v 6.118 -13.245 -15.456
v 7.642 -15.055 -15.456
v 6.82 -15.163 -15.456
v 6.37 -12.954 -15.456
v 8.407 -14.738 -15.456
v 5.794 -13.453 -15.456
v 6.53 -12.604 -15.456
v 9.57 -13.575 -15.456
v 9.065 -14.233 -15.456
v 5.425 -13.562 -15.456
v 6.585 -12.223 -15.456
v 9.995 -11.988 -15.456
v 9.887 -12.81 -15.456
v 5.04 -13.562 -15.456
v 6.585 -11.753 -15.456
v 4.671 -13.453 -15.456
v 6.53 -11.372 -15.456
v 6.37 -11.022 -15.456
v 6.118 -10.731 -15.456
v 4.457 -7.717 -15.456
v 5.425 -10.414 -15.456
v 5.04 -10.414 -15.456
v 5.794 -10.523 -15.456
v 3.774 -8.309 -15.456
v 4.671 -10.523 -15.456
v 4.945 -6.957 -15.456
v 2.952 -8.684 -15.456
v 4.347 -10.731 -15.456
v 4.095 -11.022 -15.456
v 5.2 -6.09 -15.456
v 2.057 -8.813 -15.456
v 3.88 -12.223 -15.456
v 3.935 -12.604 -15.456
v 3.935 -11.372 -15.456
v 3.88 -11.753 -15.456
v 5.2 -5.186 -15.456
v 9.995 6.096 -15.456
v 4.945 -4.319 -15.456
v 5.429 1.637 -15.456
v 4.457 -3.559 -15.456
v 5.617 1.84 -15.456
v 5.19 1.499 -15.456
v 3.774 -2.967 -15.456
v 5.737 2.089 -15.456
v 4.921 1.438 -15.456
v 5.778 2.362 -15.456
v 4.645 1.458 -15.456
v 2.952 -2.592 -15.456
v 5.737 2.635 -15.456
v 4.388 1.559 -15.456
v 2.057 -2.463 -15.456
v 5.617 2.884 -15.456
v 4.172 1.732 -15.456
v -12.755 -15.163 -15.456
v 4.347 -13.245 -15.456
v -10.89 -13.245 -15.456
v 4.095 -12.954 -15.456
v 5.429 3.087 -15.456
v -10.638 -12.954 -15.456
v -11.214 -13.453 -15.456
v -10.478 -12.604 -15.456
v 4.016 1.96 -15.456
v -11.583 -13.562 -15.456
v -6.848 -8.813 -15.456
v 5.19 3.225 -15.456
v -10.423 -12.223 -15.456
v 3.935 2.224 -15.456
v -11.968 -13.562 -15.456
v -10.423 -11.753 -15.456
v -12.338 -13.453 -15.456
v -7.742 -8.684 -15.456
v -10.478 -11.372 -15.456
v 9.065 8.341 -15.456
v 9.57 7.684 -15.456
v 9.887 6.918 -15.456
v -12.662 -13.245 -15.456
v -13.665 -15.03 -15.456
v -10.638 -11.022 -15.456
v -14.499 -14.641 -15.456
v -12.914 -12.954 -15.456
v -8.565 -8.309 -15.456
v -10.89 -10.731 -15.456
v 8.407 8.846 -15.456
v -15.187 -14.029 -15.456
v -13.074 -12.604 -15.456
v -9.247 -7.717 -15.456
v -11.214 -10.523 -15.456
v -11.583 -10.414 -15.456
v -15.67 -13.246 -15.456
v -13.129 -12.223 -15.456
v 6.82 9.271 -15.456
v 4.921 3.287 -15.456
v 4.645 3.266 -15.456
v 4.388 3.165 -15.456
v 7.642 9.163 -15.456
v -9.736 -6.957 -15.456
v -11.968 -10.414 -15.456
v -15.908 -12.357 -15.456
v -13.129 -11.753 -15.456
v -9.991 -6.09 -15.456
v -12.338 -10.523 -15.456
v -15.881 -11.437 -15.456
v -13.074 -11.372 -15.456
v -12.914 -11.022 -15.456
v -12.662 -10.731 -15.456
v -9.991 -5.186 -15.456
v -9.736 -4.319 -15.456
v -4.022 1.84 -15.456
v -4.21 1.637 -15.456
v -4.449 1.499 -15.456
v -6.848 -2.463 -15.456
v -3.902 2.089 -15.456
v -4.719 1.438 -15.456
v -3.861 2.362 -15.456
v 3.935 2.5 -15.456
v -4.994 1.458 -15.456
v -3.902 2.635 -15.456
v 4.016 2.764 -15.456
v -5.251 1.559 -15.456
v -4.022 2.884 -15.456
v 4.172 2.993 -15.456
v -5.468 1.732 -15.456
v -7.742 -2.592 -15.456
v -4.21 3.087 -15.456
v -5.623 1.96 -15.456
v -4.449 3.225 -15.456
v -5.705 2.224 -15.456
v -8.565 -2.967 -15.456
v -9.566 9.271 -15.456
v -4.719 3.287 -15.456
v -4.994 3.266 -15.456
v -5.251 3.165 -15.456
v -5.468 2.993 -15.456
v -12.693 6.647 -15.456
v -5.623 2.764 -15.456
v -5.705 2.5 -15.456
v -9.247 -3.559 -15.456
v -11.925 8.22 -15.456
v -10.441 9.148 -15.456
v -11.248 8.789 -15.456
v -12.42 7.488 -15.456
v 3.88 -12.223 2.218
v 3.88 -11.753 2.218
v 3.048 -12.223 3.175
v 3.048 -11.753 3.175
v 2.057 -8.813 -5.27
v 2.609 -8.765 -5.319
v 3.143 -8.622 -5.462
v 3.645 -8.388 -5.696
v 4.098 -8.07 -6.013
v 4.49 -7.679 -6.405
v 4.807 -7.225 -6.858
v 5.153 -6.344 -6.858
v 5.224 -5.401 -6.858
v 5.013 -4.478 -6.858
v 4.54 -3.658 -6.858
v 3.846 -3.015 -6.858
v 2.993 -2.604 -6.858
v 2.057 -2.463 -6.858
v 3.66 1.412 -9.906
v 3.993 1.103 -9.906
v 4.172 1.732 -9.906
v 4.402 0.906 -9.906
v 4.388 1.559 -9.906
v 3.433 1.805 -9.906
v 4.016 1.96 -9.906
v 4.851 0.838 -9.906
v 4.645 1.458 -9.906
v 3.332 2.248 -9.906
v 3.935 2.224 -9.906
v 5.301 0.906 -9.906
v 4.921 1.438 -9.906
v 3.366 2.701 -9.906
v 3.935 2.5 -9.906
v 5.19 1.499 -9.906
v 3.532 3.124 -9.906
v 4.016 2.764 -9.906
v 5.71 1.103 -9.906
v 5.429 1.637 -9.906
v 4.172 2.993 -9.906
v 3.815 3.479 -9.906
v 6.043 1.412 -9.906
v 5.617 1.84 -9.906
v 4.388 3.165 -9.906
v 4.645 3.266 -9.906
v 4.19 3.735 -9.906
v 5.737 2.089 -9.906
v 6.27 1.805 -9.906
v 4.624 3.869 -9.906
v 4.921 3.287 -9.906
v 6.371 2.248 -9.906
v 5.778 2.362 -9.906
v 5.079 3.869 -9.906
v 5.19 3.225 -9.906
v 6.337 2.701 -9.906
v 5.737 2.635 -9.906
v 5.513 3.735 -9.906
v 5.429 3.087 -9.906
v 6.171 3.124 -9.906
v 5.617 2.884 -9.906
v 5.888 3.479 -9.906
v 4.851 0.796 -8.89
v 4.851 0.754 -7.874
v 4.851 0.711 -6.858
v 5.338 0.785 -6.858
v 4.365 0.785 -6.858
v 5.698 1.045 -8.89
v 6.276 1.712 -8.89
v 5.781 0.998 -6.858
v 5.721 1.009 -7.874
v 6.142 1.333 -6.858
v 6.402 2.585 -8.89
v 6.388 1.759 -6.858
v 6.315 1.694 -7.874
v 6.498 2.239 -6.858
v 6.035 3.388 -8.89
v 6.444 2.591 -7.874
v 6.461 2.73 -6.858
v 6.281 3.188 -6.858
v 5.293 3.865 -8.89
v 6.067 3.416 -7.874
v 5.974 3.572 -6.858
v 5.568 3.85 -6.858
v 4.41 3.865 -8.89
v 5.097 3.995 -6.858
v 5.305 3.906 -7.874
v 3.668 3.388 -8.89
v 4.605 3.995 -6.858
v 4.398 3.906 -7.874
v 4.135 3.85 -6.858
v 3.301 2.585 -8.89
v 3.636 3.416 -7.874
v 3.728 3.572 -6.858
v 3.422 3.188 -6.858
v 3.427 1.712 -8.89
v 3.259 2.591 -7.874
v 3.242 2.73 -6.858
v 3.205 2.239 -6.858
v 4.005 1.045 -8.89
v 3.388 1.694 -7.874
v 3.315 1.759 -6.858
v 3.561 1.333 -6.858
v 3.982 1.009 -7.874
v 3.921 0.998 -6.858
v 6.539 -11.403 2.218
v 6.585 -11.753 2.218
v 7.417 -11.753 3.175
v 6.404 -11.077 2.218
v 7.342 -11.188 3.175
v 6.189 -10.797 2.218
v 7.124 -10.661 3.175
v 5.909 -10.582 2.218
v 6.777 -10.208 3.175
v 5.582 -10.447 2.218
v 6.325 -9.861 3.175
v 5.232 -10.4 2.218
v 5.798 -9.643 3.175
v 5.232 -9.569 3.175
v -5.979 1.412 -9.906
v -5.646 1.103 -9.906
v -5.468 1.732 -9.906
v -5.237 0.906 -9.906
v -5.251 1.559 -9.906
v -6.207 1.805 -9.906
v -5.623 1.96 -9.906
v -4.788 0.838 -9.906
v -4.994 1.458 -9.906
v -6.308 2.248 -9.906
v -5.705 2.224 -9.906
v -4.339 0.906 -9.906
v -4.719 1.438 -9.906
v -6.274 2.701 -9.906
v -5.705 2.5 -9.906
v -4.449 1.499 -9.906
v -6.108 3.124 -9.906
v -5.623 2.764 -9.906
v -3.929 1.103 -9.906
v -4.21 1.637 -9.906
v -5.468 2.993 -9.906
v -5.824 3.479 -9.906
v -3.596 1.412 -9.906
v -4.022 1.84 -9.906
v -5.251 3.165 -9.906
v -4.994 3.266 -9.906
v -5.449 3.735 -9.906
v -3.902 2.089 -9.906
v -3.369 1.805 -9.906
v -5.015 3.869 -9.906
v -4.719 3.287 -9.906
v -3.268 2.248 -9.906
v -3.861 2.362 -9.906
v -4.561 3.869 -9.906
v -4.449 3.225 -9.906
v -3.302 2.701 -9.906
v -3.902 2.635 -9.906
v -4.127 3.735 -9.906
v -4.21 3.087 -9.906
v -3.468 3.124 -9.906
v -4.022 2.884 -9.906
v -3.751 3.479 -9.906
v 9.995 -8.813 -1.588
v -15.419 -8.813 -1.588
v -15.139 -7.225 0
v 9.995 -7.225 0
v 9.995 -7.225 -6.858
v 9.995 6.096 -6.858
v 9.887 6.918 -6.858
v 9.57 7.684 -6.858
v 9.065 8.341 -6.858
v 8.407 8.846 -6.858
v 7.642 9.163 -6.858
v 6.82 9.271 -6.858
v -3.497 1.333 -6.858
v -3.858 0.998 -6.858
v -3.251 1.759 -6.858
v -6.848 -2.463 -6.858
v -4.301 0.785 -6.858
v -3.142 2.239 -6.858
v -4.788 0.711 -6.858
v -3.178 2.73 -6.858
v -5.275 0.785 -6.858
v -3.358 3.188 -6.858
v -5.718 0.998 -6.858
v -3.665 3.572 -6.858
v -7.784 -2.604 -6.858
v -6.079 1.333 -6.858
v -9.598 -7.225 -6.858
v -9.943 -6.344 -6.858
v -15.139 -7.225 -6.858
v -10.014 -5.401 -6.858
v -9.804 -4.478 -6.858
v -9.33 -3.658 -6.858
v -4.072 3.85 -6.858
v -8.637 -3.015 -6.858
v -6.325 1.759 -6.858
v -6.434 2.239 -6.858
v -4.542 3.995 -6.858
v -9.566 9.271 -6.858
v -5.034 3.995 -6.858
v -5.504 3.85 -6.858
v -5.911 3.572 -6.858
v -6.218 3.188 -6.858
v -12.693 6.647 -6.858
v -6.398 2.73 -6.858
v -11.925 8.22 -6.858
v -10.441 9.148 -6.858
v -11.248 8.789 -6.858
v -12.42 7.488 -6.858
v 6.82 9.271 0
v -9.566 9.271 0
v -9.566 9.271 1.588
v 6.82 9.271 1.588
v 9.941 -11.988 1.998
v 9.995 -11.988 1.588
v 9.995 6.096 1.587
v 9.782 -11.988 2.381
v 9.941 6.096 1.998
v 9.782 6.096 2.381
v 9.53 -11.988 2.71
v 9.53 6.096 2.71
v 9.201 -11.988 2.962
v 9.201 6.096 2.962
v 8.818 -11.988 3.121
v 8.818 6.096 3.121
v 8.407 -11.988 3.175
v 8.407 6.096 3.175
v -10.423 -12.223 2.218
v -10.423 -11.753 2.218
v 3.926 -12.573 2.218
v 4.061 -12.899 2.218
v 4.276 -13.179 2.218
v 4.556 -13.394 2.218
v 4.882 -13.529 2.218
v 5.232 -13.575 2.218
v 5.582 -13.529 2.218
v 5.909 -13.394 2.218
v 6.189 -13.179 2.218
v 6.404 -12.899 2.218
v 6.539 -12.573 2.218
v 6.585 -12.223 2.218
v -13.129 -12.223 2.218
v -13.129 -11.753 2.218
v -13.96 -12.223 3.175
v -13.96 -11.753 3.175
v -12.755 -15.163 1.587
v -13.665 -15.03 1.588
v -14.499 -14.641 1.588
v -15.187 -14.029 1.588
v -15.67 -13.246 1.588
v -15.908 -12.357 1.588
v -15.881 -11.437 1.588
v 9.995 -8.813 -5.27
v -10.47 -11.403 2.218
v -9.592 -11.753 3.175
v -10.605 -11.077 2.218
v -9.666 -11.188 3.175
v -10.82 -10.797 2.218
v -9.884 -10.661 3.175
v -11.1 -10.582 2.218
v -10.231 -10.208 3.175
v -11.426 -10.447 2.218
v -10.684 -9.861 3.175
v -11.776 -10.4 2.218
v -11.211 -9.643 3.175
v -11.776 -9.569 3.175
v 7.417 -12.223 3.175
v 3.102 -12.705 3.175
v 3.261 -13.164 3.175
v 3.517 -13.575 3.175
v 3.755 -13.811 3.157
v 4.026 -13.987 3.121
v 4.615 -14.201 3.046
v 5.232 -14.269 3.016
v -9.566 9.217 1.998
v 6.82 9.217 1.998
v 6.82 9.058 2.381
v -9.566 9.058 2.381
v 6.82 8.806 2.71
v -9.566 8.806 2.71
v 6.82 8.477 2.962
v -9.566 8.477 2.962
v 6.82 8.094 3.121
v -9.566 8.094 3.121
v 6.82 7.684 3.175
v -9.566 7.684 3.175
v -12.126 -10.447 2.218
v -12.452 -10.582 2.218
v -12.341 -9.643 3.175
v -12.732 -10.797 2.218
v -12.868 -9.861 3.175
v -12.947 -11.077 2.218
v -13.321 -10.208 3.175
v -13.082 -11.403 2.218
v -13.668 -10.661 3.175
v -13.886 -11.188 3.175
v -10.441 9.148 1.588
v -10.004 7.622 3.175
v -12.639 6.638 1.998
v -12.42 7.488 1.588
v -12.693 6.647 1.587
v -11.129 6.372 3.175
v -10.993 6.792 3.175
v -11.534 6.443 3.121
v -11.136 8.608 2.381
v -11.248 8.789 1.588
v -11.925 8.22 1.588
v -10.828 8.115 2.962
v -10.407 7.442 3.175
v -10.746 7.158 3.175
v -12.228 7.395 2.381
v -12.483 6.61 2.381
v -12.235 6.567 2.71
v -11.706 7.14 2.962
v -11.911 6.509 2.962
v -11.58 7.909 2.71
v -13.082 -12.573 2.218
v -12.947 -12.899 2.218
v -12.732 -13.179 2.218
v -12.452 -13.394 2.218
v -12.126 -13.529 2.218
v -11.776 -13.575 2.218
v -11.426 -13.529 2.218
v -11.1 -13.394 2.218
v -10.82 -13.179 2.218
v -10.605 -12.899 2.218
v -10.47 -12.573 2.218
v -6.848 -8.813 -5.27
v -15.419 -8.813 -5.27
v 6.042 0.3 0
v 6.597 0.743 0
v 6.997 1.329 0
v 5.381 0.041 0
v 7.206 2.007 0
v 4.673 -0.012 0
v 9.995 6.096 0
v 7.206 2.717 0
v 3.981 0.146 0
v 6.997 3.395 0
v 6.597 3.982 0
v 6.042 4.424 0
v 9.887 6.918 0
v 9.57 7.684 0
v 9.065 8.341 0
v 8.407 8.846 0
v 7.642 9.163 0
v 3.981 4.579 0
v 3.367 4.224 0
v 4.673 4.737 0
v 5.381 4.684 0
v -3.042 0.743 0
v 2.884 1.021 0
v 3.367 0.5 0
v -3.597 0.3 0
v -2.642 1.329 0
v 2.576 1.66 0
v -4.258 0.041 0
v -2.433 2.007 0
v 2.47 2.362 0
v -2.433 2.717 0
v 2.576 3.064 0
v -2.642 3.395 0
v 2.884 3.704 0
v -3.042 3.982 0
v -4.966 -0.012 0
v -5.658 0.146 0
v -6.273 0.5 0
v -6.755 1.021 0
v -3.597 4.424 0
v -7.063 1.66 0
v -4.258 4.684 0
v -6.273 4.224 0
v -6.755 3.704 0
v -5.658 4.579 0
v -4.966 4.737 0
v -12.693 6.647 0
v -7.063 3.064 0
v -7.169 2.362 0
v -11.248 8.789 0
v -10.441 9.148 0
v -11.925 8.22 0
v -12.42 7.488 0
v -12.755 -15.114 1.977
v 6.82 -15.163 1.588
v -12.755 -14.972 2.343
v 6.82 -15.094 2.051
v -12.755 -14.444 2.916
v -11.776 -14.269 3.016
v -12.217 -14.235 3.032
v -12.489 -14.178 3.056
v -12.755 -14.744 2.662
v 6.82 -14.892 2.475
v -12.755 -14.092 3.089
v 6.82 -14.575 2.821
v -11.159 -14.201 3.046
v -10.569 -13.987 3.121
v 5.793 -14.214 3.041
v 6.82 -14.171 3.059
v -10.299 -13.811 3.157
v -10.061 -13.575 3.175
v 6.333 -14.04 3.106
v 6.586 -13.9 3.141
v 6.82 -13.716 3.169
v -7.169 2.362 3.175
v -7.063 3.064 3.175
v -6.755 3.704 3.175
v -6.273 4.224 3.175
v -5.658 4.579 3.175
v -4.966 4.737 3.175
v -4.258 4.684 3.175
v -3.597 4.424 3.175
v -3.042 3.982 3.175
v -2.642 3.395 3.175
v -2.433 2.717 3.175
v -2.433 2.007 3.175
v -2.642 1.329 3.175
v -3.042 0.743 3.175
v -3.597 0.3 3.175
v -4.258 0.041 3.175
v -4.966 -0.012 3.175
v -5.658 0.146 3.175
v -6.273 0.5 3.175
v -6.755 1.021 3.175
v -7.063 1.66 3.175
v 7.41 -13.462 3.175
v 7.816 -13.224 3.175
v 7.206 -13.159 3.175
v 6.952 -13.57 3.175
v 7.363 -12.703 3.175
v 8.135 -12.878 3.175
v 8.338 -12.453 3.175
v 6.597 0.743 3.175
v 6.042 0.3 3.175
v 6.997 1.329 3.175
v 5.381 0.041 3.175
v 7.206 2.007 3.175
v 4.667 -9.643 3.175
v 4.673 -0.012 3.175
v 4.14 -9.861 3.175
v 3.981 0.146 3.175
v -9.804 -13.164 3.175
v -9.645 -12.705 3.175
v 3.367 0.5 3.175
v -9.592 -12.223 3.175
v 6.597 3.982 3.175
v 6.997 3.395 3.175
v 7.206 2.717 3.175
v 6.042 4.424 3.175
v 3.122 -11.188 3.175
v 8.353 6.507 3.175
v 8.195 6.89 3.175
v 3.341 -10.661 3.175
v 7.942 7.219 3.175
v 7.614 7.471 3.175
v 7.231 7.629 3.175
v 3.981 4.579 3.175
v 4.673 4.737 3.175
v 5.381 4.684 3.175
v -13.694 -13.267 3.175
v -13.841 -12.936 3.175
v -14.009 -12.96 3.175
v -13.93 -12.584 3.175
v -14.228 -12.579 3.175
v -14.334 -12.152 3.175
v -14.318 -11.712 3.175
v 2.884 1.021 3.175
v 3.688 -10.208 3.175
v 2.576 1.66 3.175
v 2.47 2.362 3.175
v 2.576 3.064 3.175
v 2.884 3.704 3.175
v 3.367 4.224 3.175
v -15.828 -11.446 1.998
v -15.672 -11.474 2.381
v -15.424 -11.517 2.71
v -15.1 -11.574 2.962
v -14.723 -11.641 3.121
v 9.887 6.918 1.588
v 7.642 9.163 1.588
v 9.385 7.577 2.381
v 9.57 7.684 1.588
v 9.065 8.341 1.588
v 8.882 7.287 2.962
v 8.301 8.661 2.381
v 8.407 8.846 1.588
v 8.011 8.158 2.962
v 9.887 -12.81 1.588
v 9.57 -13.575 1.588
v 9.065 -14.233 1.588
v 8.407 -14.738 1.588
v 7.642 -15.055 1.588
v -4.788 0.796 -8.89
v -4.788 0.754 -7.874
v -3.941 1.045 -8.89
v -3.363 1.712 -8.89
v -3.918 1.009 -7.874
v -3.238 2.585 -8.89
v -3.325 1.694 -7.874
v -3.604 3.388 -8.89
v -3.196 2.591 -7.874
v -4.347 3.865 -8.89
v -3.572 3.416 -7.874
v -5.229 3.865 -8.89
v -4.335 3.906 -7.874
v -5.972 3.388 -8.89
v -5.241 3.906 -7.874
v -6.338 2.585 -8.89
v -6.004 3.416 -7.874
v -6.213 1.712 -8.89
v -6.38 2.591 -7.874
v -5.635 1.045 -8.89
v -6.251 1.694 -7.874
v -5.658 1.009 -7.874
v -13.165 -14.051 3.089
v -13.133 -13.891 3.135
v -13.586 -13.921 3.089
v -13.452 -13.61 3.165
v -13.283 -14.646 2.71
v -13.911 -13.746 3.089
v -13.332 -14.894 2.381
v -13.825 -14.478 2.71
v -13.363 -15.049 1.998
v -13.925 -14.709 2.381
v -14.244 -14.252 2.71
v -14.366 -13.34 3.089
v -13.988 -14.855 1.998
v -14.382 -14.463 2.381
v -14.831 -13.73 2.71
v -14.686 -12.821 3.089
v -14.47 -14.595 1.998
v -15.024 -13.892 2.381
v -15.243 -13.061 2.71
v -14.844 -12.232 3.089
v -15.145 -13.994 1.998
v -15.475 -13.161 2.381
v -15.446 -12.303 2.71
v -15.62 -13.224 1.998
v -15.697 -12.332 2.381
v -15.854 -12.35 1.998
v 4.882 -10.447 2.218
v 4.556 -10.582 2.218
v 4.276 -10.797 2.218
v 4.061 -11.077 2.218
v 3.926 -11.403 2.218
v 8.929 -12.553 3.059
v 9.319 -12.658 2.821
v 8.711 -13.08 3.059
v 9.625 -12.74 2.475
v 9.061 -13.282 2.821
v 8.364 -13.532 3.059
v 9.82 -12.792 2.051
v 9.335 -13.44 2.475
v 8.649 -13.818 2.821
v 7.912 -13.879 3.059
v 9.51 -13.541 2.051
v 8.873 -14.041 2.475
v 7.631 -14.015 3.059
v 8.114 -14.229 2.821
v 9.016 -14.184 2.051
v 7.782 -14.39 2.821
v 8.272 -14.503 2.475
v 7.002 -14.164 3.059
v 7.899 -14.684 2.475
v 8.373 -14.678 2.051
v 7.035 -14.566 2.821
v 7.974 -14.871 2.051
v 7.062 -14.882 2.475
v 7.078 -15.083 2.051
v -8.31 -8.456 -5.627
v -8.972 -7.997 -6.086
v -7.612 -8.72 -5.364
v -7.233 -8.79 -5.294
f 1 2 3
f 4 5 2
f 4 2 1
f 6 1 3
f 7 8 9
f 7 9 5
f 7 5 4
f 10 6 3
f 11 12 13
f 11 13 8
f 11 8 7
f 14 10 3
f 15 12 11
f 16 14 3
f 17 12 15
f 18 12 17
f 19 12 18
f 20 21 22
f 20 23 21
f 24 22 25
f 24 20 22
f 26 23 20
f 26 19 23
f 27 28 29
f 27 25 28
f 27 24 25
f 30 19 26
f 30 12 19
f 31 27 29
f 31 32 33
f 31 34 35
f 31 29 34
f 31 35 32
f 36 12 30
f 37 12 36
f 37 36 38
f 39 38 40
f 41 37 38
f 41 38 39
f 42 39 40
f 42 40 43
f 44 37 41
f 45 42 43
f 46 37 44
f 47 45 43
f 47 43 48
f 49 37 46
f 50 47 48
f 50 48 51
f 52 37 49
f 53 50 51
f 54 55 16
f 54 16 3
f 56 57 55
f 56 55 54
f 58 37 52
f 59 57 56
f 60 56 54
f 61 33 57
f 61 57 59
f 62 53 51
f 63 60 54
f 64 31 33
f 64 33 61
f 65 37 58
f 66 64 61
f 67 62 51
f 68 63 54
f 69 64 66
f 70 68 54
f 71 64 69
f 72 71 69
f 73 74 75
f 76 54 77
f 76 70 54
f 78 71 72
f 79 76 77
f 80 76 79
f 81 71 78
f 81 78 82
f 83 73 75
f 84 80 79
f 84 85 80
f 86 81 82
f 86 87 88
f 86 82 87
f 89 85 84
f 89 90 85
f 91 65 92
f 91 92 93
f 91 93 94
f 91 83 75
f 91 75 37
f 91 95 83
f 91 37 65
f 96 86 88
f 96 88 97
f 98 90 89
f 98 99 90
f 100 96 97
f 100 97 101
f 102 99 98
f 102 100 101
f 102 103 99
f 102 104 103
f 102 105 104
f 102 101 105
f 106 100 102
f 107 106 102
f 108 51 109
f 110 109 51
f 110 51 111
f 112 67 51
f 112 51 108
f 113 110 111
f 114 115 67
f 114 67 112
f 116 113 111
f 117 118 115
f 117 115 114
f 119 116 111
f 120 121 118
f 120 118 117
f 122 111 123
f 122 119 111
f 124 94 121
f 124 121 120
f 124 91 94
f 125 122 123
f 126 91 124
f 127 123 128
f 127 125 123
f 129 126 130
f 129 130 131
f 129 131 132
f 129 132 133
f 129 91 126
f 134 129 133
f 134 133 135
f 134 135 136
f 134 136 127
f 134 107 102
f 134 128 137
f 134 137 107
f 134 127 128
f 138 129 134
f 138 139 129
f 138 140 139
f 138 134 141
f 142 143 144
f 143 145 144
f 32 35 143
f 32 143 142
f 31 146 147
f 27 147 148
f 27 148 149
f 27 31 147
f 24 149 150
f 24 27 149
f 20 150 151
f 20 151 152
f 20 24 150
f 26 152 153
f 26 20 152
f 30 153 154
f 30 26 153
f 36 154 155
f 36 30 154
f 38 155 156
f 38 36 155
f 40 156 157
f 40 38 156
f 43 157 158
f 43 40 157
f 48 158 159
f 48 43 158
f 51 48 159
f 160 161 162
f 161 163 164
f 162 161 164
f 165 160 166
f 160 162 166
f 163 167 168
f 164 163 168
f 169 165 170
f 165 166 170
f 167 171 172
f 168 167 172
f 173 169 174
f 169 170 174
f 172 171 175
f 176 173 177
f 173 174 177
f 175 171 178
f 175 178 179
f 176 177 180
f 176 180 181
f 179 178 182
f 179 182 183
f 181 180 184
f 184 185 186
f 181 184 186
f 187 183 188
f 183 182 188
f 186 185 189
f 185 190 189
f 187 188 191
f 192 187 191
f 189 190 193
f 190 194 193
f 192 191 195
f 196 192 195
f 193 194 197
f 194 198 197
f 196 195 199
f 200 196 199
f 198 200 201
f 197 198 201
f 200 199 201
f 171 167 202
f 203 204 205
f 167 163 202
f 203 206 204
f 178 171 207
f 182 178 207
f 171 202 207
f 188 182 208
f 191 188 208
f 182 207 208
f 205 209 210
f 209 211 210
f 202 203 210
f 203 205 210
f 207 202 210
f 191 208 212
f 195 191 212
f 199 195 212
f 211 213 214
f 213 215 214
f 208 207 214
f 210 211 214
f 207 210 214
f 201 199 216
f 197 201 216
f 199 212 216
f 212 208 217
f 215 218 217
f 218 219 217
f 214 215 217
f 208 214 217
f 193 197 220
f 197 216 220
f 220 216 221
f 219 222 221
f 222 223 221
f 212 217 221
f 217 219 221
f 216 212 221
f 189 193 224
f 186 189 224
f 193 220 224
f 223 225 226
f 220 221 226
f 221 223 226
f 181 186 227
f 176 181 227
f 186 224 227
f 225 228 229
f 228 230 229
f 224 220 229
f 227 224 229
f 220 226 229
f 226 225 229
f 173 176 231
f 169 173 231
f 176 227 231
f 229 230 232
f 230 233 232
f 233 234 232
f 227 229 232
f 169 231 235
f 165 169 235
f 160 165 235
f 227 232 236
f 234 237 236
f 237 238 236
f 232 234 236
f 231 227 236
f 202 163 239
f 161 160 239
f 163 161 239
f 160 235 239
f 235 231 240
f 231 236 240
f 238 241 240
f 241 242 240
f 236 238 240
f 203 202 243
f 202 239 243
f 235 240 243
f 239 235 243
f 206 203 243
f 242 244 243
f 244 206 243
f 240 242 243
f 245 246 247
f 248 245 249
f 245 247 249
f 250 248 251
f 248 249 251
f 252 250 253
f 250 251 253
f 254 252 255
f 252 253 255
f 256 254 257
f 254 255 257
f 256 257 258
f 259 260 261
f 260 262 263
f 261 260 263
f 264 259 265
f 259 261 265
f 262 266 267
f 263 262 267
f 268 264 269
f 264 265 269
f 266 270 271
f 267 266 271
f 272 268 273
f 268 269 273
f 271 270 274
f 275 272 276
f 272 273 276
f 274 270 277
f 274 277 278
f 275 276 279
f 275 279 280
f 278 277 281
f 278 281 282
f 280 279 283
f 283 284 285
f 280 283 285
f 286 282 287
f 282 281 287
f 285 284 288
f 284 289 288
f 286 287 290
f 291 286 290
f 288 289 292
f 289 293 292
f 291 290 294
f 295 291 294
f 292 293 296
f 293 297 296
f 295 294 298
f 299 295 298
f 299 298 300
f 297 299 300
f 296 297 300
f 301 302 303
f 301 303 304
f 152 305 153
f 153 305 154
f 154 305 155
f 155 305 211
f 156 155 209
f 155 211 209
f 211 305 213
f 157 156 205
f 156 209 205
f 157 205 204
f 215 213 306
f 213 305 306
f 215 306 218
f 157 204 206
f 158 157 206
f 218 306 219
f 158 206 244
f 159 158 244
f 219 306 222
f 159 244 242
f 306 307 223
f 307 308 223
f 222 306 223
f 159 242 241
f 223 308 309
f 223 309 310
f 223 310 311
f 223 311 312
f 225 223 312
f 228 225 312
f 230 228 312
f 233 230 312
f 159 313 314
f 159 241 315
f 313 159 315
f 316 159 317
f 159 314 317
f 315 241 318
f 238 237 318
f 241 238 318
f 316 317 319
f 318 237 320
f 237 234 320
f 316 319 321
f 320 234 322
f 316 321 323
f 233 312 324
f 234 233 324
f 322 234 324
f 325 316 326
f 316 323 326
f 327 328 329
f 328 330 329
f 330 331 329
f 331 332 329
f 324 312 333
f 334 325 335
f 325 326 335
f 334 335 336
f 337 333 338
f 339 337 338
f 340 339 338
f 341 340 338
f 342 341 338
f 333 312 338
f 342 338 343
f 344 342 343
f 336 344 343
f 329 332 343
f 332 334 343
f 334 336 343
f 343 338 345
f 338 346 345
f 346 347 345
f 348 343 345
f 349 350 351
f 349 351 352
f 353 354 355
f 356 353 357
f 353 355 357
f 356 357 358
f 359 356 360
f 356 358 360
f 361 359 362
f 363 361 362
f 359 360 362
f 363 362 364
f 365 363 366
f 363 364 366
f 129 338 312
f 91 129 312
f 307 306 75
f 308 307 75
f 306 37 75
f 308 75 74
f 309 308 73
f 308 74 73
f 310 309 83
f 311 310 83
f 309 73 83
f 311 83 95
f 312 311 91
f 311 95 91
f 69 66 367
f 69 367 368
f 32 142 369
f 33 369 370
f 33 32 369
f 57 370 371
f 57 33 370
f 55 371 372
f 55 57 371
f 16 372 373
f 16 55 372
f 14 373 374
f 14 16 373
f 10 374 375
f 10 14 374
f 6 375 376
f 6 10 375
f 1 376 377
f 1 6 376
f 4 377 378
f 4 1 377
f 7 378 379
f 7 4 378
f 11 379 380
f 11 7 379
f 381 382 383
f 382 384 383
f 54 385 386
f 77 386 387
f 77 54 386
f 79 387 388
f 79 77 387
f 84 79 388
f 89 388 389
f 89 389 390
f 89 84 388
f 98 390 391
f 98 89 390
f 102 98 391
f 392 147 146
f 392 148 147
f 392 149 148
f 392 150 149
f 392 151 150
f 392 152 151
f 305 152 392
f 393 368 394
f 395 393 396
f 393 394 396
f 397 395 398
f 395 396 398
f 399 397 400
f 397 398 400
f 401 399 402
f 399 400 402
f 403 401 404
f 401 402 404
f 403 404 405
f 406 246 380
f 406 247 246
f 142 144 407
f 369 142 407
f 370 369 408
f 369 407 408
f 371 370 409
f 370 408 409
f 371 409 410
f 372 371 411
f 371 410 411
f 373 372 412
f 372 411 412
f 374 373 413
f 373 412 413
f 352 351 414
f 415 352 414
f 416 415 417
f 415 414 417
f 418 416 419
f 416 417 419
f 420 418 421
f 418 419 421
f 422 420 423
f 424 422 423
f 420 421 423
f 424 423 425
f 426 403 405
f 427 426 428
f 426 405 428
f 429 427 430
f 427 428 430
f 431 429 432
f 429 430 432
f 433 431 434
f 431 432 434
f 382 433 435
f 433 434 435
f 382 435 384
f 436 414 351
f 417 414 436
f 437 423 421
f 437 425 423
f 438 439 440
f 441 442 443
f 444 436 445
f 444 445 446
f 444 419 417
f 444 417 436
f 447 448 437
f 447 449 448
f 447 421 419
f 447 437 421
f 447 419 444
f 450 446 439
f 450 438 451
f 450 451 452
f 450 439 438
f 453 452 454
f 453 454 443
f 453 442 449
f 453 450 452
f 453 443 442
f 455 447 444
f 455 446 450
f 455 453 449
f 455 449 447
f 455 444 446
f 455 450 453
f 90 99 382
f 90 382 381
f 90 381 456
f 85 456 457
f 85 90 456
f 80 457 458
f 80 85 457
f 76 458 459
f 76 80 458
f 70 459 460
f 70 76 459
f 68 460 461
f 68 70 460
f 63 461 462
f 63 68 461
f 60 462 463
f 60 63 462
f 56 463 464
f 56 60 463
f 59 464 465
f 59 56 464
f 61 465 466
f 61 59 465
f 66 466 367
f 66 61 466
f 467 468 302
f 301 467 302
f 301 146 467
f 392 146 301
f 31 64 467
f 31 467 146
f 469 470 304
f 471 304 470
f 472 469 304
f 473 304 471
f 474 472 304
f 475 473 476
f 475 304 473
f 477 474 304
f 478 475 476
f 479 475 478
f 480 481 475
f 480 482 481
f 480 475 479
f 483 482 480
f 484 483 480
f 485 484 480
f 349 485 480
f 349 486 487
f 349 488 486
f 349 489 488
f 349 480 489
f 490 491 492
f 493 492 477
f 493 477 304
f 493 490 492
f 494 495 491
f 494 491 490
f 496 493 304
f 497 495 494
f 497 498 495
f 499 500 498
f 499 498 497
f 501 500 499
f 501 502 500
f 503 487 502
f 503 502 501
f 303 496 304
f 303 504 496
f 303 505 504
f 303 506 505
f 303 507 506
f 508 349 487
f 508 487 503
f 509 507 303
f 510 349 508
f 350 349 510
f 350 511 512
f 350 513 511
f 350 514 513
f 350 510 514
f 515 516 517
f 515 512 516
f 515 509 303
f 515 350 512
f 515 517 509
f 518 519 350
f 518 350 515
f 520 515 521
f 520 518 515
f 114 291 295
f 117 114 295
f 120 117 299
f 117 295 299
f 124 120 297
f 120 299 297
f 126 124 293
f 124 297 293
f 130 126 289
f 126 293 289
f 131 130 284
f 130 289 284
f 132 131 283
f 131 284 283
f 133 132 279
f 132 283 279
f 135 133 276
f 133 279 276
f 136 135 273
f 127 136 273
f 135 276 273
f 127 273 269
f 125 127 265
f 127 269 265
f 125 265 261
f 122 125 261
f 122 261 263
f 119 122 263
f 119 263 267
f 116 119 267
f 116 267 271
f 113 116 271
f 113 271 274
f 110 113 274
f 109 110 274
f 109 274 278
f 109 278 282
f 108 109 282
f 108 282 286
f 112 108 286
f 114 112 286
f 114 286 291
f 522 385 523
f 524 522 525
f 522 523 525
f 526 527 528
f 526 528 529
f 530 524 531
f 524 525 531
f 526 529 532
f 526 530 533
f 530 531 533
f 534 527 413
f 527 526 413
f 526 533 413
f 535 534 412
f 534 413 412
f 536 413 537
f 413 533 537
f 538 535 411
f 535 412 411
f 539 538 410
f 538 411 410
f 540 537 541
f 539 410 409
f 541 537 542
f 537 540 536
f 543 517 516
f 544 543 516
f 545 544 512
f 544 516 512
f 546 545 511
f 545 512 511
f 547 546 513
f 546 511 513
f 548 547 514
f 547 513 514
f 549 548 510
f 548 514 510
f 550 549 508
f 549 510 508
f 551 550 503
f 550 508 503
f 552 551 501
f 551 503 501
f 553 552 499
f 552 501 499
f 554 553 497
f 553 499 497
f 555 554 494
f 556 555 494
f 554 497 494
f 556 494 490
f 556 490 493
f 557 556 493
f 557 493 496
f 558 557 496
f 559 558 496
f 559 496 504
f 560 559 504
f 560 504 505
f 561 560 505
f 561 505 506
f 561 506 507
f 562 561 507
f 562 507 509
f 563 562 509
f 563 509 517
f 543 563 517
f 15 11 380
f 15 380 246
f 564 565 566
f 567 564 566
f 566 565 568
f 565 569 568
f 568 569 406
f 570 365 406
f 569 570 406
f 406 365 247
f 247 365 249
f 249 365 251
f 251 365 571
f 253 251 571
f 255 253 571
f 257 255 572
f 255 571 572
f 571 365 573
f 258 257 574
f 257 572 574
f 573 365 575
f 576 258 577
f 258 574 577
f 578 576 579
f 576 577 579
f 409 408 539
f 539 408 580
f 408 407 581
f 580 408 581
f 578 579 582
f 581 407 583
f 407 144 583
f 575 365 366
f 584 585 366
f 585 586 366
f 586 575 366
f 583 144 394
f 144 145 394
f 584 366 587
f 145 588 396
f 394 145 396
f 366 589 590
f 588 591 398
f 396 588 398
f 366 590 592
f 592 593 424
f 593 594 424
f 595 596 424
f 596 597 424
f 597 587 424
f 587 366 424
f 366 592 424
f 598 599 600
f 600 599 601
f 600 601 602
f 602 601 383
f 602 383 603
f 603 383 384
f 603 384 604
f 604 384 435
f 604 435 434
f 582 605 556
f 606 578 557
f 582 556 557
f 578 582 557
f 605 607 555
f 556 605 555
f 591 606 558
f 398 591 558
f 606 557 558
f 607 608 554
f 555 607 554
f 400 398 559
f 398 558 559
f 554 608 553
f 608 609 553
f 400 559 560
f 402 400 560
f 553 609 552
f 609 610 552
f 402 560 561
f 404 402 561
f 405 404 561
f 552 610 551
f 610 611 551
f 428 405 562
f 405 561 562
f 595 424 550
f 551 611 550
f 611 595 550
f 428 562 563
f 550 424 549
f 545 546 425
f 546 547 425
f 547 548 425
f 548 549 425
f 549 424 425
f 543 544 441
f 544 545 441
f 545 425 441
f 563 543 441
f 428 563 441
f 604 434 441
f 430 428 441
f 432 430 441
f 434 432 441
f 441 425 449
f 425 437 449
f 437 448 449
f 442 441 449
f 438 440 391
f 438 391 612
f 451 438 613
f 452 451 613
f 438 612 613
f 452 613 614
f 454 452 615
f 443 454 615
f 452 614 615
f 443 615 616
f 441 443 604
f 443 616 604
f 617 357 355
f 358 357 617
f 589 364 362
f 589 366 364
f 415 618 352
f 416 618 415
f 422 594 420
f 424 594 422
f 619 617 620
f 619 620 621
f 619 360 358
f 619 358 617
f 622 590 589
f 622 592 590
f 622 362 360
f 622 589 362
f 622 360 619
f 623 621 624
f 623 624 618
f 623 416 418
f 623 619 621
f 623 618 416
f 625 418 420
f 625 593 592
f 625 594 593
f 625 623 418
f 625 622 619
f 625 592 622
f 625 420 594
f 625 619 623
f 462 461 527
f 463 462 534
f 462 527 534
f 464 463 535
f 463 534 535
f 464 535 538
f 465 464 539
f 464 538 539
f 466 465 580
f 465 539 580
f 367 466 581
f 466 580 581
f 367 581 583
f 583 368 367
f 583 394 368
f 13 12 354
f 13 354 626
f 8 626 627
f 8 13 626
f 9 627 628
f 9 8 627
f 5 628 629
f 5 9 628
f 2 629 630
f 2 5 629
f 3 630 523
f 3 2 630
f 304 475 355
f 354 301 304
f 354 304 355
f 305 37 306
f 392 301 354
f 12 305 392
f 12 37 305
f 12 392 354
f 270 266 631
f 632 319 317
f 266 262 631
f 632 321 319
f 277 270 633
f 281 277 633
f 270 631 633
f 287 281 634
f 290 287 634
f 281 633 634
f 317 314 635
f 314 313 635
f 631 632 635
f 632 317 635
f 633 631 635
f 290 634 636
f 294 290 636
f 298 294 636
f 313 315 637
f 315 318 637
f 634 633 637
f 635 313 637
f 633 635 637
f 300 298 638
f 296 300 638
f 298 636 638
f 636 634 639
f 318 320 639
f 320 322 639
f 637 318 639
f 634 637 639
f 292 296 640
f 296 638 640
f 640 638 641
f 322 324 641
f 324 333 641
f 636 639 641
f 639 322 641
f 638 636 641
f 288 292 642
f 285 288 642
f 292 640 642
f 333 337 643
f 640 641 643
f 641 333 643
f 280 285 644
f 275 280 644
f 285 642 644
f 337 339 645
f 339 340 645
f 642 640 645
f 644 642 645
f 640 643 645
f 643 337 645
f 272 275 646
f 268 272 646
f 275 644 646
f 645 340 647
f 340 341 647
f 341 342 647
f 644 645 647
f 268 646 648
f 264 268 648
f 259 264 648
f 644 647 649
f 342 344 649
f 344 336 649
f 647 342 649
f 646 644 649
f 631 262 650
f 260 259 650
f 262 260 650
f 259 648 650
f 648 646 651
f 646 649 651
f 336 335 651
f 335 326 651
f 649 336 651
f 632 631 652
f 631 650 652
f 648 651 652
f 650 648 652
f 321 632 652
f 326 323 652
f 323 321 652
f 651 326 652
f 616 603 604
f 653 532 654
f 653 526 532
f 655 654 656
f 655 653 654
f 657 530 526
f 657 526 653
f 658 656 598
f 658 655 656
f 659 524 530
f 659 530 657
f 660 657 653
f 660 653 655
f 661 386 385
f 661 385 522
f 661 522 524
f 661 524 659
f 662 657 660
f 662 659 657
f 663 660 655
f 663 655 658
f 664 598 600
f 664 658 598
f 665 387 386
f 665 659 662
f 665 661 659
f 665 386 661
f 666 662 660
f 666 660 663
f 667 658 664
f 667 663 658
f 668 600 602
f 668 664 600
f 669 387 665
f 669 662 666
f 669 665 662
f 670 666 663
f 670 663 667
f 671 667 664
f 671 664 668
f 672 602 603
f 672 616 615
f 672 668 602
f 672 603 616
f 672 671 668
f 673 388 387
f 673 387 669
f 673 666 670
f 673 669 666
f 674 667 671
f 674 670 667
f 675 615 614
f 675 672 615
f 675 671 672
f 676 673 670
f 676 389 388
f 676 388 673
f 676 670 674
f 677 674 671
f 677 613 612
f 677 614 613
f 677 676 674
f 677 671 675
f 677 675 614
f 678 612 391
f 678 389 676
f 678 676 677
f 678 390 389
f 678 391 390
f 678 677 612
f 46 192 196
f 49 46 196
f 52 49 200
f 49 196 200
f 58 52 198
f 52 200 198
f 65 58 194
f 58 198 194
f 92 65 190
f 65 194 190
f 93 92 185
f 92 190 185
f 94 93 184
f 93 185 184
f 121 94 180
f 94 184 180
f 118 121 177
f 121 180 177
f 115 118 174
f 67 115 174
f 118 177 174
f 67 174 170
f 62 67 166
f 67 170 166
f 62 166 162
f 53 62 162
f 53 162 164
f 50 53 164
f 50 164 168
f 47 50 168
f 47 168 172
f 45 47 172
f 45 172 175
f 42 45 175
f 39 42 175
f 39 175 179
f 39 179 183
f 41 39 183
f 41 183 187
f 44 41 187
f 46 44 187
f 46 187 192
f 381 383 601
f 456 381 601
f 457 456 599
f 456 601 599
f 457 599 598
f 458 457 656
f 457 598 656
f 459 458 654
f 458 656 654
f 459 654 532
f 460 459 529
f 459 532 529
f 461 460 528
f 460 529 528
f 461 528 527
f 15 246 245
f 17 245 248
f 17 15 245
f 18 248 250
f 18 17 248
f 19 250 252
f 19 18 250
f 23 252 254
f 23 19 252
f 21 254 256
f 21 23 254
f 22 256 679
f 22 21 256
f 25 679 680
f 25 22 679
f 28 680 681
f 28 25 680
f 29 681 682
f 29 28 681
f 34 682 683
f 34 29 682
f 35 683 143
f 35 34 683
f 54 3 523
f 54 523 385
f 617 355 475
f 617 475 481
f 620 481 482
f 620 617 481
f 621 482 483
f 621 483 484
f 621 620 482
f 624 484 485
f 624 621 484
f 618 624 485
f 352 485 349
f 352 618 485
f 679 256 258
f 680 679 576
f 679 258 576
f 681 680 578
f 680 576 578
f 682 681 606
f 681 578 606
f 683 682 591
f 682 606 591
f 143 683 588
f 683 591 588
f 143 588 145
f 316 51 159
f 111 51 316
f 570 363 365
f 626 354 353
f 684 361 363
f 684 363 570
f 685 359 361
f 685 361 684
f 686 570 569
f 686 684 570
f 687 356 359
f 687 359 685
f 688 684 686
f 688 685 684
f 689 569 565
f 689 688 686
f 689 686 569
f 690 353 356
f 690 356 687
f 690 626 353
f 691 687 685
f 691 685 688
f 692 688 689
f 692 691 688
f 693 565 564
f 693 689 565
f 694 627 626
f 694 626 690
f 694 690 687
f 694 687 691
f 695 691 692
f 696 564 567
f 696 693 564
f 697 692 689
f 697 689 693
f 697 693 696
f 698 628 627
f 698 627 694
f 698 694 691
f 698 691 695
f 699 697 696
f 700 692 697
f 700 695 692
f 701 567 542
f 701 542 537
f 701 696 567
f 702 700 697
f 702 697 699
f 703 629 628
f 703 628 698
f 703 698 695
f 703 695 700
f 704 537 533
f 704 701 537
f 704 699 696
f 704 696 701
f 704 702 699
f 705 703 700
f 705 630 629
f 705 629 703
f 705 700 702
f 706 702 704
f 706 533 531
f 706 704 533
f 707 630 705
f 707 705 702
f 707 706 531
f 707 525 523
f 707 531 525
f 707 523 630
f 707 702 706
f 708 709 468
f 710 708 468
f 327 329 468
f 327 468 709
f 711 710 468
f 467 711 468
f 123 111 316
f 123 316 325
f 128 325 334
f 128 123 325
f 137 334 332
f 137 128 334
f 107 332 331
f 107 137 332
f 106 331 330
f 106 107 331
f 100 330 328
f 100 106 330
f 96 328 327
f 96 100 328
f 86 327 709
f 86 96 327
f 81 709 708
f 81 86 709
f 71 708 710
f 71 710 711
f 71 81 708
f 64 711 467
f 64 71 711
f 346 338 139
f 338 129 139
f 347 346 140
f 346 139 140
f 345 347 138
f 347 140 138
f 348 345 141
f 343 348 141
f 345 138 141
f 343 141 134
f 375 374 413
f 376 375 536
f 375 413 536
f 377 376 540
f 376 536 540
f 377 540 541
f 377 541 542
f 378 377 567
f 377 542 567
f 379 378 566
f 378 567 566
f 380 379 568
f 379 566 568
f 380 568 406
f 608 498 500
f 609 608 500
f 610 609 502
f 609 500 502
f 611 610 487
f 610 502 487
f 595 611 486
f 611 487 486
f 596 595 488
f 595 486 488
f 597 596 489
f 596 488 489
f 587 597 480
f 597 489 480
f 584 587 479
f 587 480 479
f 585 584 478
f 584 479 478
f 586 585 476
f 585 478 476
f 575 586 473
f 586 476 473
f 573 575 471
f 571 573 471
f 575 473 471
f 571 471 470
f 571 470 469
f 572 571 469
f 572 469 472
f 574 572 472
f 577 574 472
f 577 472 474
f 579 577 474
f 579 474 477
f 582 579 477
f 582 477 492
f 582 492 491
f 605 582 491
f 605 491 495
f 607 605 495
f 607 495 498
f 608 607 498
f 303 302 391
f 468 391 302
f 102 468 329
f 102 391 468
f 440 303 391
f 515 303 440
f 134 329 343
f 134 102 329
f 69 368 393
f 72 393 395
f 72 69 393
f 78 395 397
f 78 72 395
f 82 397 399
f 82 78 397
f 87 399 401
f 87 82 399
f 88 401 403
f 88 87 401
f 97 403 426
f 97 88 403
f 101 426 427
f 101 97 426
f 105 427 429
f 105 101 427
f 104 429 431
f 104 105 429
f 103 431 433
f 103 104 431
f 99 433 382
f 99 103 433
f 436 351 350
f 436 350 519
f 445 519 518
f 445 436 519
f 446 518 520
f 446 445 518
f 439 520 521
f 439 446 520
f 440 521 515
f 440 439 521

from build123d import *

# Parameters (mm, degrees)
BOSS_EXTRUDE1_DEPTH                           = 3.175
BOSS_EXTRUDE2_START                           = -6.8580000000000005
BOSS_EXTRUDE2_DEPTH                           = 8.5979
BOSS_EXTRUDE3_DEPTH                           = 6.858
CSK_START                                     = -16
CSK_SLOT_FOR_2_FLAT_HEAD_MACHINE_SCREW1_DEPTH = 19.175
FILLET1_R                                     = 3.175
CHAMFER1_SIZE                                 = 1.5875
F_3_16_0_1875_DIAMETER_HOLE1_D                = 4.7625
F_3_16_0_1875_DIAMETER_HOLE1_DEPTH            = 3.175
F_0_CLEARANCE_HOLE1_D                         = 1.8542
HOLE1_AT_2_COUNT                              = 2
HOLE1_AT_2_PITCH                              = 9.639299999999615
CUT_EXTRUDE2_REACH                            = 30.823
FILLET3_R                                     = 1.5875


with BuildPart() as part:
    # Sketch1 → Boss-Extrude1 (new body)
    with BuildSketch(Plane.XY):
        Polygon((9.994900000000026, 9.271000000002116), (9.99490000000003, -15.162995594937385), (-16.538472669899683, -15.162995594937387), (-12.230099999999974, 9.271000000002113), align=None)
    extrude(amount=BOSS_EXTRUDE1_DEPTH)



with BuildPart() as body_2:
    # Sketch1<2> → Boss-Extrude2 (new body)
    with BuildSketch(Plane.XY.offset(BOSS_EXTRUDE2_START)):
        Polygon((9.994900000000026, 9.271000000002116), (9.99490000000003, -15.162995594937385), (-16.538472669899683, -15.162995594937387), (-12.230099999999974, 9.271000000002113), align=None)
    extrude(amount=-BOSS_EXTRUDE2_DEPTH)


with BuildPart() as part_1:
    add(part.part)

    add(body_2.part)  # Boss-Extrude3 merges body 2
    # Sketch3 → Boss-Extrude3 (add)
    with BuildSketch(Plane.XY.offset(-6.8580000000000005)):
        Polygon((9.994900000000026, -8.812995594937385), (9.99490000000003, -15.162995594937385), (-16.538472669899683, -15.162995594937387), (-15.418796342400908, -8.812995594937385), align=None)
    extrude(amount=BOSS_EXTRUDE3_DEPTH)

    # CSK SLOT for #2 Flat Head Machine Screw1: read off the stored shape, not the designer's step
    # CSK SLOT for _2 Flat Head Machine Sc 2 → CSK SLOT for #2 Flat Head Machine Screw1 (cut)
    with BuildSketch(Plane.XY.offset(CSK_START)):
        with BuildLine():
            Line((-10.42342267, -12.222945595), (-10.42342267, -11.753045595))
            ThreePointArc((-10.42342267, -11.753045595), (-11.77597267, -10.400495595), (-13.12852267, -11.753045595))
            Line((-13.12852267, -11.753045595), (-13.12852267, -12.222945595))
            ThreePointArc((-13.12852267, -12.222945595), (-11.77597267, -13.575495595), (-10.42342267, -12.222945595))
        make_face()
        with BuildLine():
            Line((6.58495, -12.222945595), (6.58495, -11.753045595))
            ThreePointArc((6.58495, -11.753045595), (5.2324, -10.400495595), (3.87985, -11.753045595))
            Line((3.87985, -11.753045595), (3.87985, -12.222945595))
            ThreePointArc((3.87985, -12.222945595), (5.2324, -13.575495595), (6.58495, -12.222945595))
        make_face()
    extrude(amount=CSK_SLOT_FOR_2_FLAT_HEAD_MACHINE_SCREW1_DEPTH, mode=Mode.SUBTRACT)

    # CSK SLOT for _2 Flat Head Machine Sc 3: loft between two sections, ruled curve by curve
    csk_slot_for_2_flat_head_machine_sc_3_from = [
        Edge.make_three_point_arc((-10.42342267, -11.753045595, 2.21806604), (-10.819575393, -10.796648318, 2.21806604), (-11.77597267, -10.400495595, 2.21806604)),
        Edge.make_three_point_arc((-11.77597267, -10.400495595, 2.21806604), (-12.732369947, -10.796648318, 2.21806604), (-13.12852267, -11.753045595, 2.21806604)),
        Edge.make_three_point_arc((-13.12852267, -12.222945595, 2.21806604), (-12.732369947, -13.179342872, 2.21806604), (-11.77597267, -13.575495595, 2.21806604)),
        Edge.make_three_point_arc((-11.77597267, -13.575495595, 2.21806604), (-10.819575393, -13.179342872, 2.21806604), (-10.42342267, -12.222945595, 2.21806604)),
        Edge.make_line((-13.12852267, -11.753045595, 2.21806604), (-13.12852267, -12.222945595, 2.21806604)),
        Edge.make_line((-10.42342267, -11.753045595, 2.21806604), (-10.42342267, -12.222945595, 2.21806604)),
    ]
    csk_slot_for_2_flat_head_machine_sc_3_to = [
        Edge.make_three_point_arc((-9.59157267, -11.753045595, 3.175), (-10.231368617, -10.208441542, 3.175), (-11.77597267, -9.568645595, 3.175)),
        Edge.make_three_point_arc((-11.77597267, -9.568645595, 3.175), (-13.320576723, -10.208441542, 3.175), (-13.96037267, -11.753045595, 3.175)),
        Edge.make_three_point_arc((-13.96037267, -12.222945595, 3.175), (-13.320576723, -13.767549648, 3.175), (-11.77597267, -14.407345595, 3.175)),
        Edge.make_three_point_arc((-11.77597267, -14.407345595, 3.175), (-10.231368617, -13.767549648, 3.175), (-9.59157267, -12.222945595, 3.175)),
        Edge.make_line((-13.96037267, -11.753045595, 3.175), (-13.96037267, -12.222945595, 3.175)),
        Edge.make_line((-9.59157267, -11.753045595, 3.175), (-9.59157267, -12.222945595, 3.175)),
    ]
    csk_slot_for_2_flat_head_machine_sc_3 = Solid(Shell([*[Face.make_surface_from_curves(csk_slot_for_2_flat_head_machine_sc_3_from[k], csk_slot_for_2_flat_head_machine_sc_3_to[k]) for k in range(6)], Face(Wire(csk_slot_for_2_flat_head_machine_sc_3_from)), Face(Wire(csk_slot_for_2_flat_head_machine_sc_3_to))]))
    add(csk_slot_for_2_flat_head_machine_sc_3, mode=Mode.SUBTRACT)

    # CSK SLOT for _2 Flat Head Machine Sc 4: loft between two sections, ruled curve by curve
    csk_slot_for_2_flat_head_machine_sc_4_from = [
        Edge.make_three_point_arc((6.58495, -11.753045595, 2.21806604), (6.188797277, -10.796648318, 2.21806604), (5.2324, -10.400495595, 2.21806604)),
        Edge.make_three_point_arc((5.2324, -10.400495595, 2.21806604), (4.276002723, -10.796648318, 2.21806604), (3.87985, -11.753045595, 2.21806604)),
        Edge.make_three_point_arc((3.87985, -12.222945595, 2.21806604), (4.276002723, -13.179342872, 2.21806604), (5.2324, -13.575495595, 2.21806604)),
        Edge.make_three_point_arc((5.2324, -13.575495595, 2.21806604), (6.188797277, -13.179342872, 2.21806604), (6.58495, -12.222945595, 2.21806604)),
        Edge.make_line((3.87985, -11.753045595, 2.21806604), (3.87985, -12.222945595, 2.21806604)),
        Edge.make_line((6.58495, -11.753045595, 2.21806604), (6.58495, -12.222945595, 2.21806604)),
    ]
    csk_slot_for_2_flat_head_machine_sc_4_to = [
        Edge.make_three_point_arc((7.4168, -11.753045595, 3.175), (6.777004053, -10.208441542, 3.175), (5.2324, -9.568645595, 3.175)),
        Edge.make_three_point_arc((5.2324, -9.568645595, 3.175), (3.687795947, -10.208441542, 3.175), (3.048, -11.753045595, 3.175)),
        Edge.make_three_point_arc((3.048, -12.222945595, 3.175), (3.687795947, -13.767549648, 3.175), (5.2324, -14.407345595, 3.175)),
        Edge.make_three_point_arc((5.2324, -14.407345595, 3.175), (6.777004053, -13.767549648, 3.175), (7.4168, -12.222945595, 3.175)),
        Edge.make_line((3.048, -11.753045595, 3.175), (3.048, -12.222945595, 3.175)),
        Edge.make_line((7.4168, -11.753045595, 3.175), (7.4168, -12.222945595, 3.175)),
    ]
    csk_slot_for_2_flat_head_machine_sc_4 = Solid(Shell([*[Face.make_surface_from_curves(csk_slot_for_2_flat_head_machine_sc_4_from[k], csk_slot_for_2_flat_head_machine_sc_4_to[k]) for k in range(6)], Face(Wire(csk_slot_for_2_flat_head_machine_sc_4_from)), Face(Wire(csk_slot_for_2_flat_head_machine_sc_4_to))]))
    add(csk_slot_for_2_flat_head_machine_sc_4, mode=Mode.SUBTRACT)

    # Fillet1
    fillet1_edges = [part_1.edges().sort_by_distance(p)[0] for p in [
        (-12.230099999999974, 9.271000000002113, -11.15695),
        (9.994900000000026, 9.271000000002116, -11.15695),
        (9.994900000000026, 9.271000000002116, 1.5875),
        (9.99490000000003, -15.162995594937385, -6.14045),
        (-16.538472669899683, -15.162995594937387, -6.14045),
        (-12.230099999999974, 9.271000000002113, 1.5875),
    ]]
    fillet(fillet1_edges, radius=FILLET1_R)

    # Chamfer1
    chamfer1_edges = [part_1.edges().sort_by_distance(p)[0] for p in [
        (-2.711948171200442, -8.812995594937385, -6.8580000000000005),
        (-2.711948171200442, -8.812995594937385, -8.9e-16),
    ]]
    chamfer(chamfer1_edges, length=CHAMFER1_SIZE)

    # 3/16 (0.1875) Diameter Hole1
    with Locations(Plane.XY.offset(3.175)):
        with Locations((4.8514, 2.3622), (-4.7879, 2.3622)):
            Hole(F_3_16_0_1875_DIAMETER_HOLE1_D / 2, depth=F_3_16_0_1875_DIAMETER_HOLE1_DEPTH)

    # #0 Clearance Hole1 (through all)
    with Locations(Plane(origin=(8.5e-16, -4.198e-14, -15.455900000000726), x_dir=(-1, 0, -6e-17), z_dir=(6e-17, -2.72e-15, -1))):
        with Locations((-4.8514, 2.3622), (4.7879, 2.3622)):
            Hole(F_0_CLEARANCE_HOLE1_D / 2)

    # Sketch11 → Hole1 (revolve, cut)
    with BuildSketch(Plane(origin=(4.851400000000893, 2.362200000000807, -6.8580000000000005), x_dir=(0, -1, 0), z_dir=(1, 0, 0))):
        Polygon((0, 0), (0, 3.047999999999995), (1.524000000000013, 3.047999999999995), (1.6510000000000136, 0), align=None)
    hole1 = revolve(axis=Axis((4.851400000000893, 2.362200000000807, -116.858), (0, 0, 1)), mode=Mode.SUBTRACT)

    # Hole1 at 2: Hole1 ×2
    with Locations(*[(-i * HOLE1_AT_2_PITCH, 0, 0) for i in range(1, HOLE1_AT_2_COUNT)]):
        add(hole1, mode=Mode.SUBTRACT)

    # Sketch13 → Cut-Extrude2 (cut, up to next)
    with BuildSketch(Plane(origin=(8.5e-16, -4.198e-14, -15.455900000000726), x_dir=(-1, 0, -6e-17), z_dir=(6e-17, -2.72e-15, -1)), mode=Mode.PRIVATE) as cut_extrude2_sk1:
        with BuildLine():
            Line((-2.0574000000000243, -2.4629955949373814), (6.847988939545661, -2.4629955949373823))
            ThreePointArc((6.847988939545661, -2.4629955949373823), (10.022988939545662, -5.637995594937381), (6.847988939545661, -8.812995594937382))
            Line((6.847988939545661, -8.812995594937382), (-2.0574000000000243, -8.812995594937382))
            ThreePointArc((-2.0574000000000243, -8.812995594937382), (-5.232400000000023, -5.63799559493738), (-2.0574000000000243, -2.4629955949373814))
        make_face()
    cut_extrude2_tool1 = extrude(cut_extrude2_sk1.sketch, amount=-CUT_EXTRUDE2_REACH, mode=Mode.PRIVATE) & part_1.part
    add(cut_extrude2_tool1.solids().sort_by_distance((-2.395294, -5.637996, -15.4559))[0], mode=Mode.SUBTRACT)

    # Fillet3
    # the kernel refuses this fillet: 1.5875 mm, written as the material it takes off along each edge
    with BuildSketch(Plane(origin=(-15.88141962922681, -11.436662630844875, 3.175), x_dir=(0.9848077530122074, -0.173648177666934, 0), z_dir=(0.17364817766693402, 0.9848077530122075, 0))) as fillet3_piece_1:
        with BuildLine():
            CenterArc((FILLET3_R, FILLET3_R), FILLET3_R, 180, 90)
            Line((-2.06e-15, FILLET3_R), (0, 0))
            Line((0, 0), (FILLET3_R, 0))
        make_face()
    extrude(amount=18.362970376326174, mode=Mode.SUBTRACT)
    with BuildSketch(Plane(origin=(-9.565958671012117, 9.271000000002113, 3.175), x_dir=(1.6e-16, -1, 0), z_dir=(1, 1.6e-16, 0))) as fillet3_piece_2:
        with BuildLine():
            CenterArc((FILLET3_R, FILLET3_R), FILLET3_R, 180, 90)
            Line((0, FILLET3_R), (0, 0))
            Line((0, 0), (FILLET3_R, 0))
        make_face()
    extrude(amount=16.385858671012144, mode=Mode.SUBTRACT)
    with BuildSketch(Plane(origin=(6.819900000000029, -15.162995594937385, 3.175), x_dir=(-7e-17, 1, 0), z_dir=(-1, -7e-17, 0))) as fillet3_piece_3:
        with BuildLine():
            CenterArc((FILLET3_R, FILLET3_R), FILLET3_R, 180, 90)
            Line((0, FILLET3_R), (0, 0))
            Line((0, 0), (FILLET3_R, 0))
        make_face()
    extrude(amount=19.574555013413082, mode=Mode.SUBTRACT)
    with BuildSketch(Plane(origin=(9.994900000000026, 6.096000000002116, 3.175), x_dir=(0, 0, -1), z_dir=(1.5e-16, -1, 0))) as fillet3_piece_4:
        with BuildLine():
            CenterArc((FILLET3_R, -FILLET3_R), FILLET3_R, 90, 90)
            Line((0, -FILLET3_R), (0, 0))
            Line((0, 0), (FILLET3_R, 0))
        make_face()
    extrude(amount=18.0839955949395, mode=Mode.SUBTRACT)
    with BuildSketch(Plane(origin=(-12.754655013413053, -11.987995594937388, 3.175), x_dir=(0, -1, 0), z_dir=(1, 0, 0))) as fillet3_piece_5:
        with BuildLine():
            CenterArc((3.1750000000000007 - FILLET3_R, FILLET3_R), FILLET3_R, 270, 89.99999999999999)
            Line((3.1750000000000007, FILLET3_R), (3.1750000000000007, 0))
            Line((3.1750000000000007, 0), (3.1750000000000007 - FILLET3_R, 0))
        make_face()
    revolve(axis=Axis((-12.754655013413053, -11.987995594937388, 3.175), (0, 0, -1)), revolution_arc=100.00000000000018, mode=Mode.SUBTRACT)
    with BuildSketch(Plane(origin=(6.819900000000029, -11.987995594937384, 3.175), x_dir=(1, 0, 0), z_dir=(0, 1, 0))) as fillet3_piece_6:
        with BuildLine():
            CenterArc((3.1750000000000007 - FILLET3_R, FILLET3_R), FILLET3_R, 270, 89.99999999999999)
            Line((3.1750000000000007, FILLET3_R), (3.1750000000000007, 0))
            Line((3.1750000000000007, 0), (3.1750000000000007 - FILLET3_R, 0))
        make_face()
    revolve(axis=Axis((6.819900000000029, -11.987995594937384, 3.175), (0, 0, -1)), revolution_arc=90, mode=Mode.SUBTRACT)
    with BuildSketch(Plane(origin=(6.819900000000027, 6.096000000002116, 3.175), x_dir=(1, 5.6e-16, 0), z_dir=(5.6e-16, -1, 0))) as fillet3_piece_7:
        with BuildLine():
            CenterArc((3.174999999999999 - FILLET3_R, -FILLET3_R), FILLET3_R, 0, 90)
            Line((3.174999999999999 - FILLET3_R, 0), (3.174999999999999, 0))
            Line((3.174999999999999, 0), (3.174999999999999, -FILLET3_R))
        make_face()
    revolve(axis=Axis((6.819900000000027, 6.096000000002116, 3.175), (0, 0, 1)), revolution_arc=89.99999999999996, mode=Mode.SUBTRACT)
    with BuildSketch(Plane(origin=(-9.565958671012119, 6.096000000002116, 3.175), x_dir=(0, 1, 0), z_dir=(1, 0, 0))) as fillet3_piece_8:
        with BuildLine():
            CenterArc((3.174999999999999 - FILLET3_R, -FILLET3_R), FILLET3_R, 1.603e-14, 90)
            Line((3.174999999999999, -FILLET3_R), (3.174999999999999, 0))
            Line((3.174999999999999, 0), (3.174999999999999 - FILLET3_R, 0))
        make_face()
    revolve(axis=Axis((-9.565958671012119, 6.096000000002116, 3.175), (0, 0, 1)), revolution_arc=79.99999999999976, mode=Mode.SUBTRACT)


solid = part_1.part
